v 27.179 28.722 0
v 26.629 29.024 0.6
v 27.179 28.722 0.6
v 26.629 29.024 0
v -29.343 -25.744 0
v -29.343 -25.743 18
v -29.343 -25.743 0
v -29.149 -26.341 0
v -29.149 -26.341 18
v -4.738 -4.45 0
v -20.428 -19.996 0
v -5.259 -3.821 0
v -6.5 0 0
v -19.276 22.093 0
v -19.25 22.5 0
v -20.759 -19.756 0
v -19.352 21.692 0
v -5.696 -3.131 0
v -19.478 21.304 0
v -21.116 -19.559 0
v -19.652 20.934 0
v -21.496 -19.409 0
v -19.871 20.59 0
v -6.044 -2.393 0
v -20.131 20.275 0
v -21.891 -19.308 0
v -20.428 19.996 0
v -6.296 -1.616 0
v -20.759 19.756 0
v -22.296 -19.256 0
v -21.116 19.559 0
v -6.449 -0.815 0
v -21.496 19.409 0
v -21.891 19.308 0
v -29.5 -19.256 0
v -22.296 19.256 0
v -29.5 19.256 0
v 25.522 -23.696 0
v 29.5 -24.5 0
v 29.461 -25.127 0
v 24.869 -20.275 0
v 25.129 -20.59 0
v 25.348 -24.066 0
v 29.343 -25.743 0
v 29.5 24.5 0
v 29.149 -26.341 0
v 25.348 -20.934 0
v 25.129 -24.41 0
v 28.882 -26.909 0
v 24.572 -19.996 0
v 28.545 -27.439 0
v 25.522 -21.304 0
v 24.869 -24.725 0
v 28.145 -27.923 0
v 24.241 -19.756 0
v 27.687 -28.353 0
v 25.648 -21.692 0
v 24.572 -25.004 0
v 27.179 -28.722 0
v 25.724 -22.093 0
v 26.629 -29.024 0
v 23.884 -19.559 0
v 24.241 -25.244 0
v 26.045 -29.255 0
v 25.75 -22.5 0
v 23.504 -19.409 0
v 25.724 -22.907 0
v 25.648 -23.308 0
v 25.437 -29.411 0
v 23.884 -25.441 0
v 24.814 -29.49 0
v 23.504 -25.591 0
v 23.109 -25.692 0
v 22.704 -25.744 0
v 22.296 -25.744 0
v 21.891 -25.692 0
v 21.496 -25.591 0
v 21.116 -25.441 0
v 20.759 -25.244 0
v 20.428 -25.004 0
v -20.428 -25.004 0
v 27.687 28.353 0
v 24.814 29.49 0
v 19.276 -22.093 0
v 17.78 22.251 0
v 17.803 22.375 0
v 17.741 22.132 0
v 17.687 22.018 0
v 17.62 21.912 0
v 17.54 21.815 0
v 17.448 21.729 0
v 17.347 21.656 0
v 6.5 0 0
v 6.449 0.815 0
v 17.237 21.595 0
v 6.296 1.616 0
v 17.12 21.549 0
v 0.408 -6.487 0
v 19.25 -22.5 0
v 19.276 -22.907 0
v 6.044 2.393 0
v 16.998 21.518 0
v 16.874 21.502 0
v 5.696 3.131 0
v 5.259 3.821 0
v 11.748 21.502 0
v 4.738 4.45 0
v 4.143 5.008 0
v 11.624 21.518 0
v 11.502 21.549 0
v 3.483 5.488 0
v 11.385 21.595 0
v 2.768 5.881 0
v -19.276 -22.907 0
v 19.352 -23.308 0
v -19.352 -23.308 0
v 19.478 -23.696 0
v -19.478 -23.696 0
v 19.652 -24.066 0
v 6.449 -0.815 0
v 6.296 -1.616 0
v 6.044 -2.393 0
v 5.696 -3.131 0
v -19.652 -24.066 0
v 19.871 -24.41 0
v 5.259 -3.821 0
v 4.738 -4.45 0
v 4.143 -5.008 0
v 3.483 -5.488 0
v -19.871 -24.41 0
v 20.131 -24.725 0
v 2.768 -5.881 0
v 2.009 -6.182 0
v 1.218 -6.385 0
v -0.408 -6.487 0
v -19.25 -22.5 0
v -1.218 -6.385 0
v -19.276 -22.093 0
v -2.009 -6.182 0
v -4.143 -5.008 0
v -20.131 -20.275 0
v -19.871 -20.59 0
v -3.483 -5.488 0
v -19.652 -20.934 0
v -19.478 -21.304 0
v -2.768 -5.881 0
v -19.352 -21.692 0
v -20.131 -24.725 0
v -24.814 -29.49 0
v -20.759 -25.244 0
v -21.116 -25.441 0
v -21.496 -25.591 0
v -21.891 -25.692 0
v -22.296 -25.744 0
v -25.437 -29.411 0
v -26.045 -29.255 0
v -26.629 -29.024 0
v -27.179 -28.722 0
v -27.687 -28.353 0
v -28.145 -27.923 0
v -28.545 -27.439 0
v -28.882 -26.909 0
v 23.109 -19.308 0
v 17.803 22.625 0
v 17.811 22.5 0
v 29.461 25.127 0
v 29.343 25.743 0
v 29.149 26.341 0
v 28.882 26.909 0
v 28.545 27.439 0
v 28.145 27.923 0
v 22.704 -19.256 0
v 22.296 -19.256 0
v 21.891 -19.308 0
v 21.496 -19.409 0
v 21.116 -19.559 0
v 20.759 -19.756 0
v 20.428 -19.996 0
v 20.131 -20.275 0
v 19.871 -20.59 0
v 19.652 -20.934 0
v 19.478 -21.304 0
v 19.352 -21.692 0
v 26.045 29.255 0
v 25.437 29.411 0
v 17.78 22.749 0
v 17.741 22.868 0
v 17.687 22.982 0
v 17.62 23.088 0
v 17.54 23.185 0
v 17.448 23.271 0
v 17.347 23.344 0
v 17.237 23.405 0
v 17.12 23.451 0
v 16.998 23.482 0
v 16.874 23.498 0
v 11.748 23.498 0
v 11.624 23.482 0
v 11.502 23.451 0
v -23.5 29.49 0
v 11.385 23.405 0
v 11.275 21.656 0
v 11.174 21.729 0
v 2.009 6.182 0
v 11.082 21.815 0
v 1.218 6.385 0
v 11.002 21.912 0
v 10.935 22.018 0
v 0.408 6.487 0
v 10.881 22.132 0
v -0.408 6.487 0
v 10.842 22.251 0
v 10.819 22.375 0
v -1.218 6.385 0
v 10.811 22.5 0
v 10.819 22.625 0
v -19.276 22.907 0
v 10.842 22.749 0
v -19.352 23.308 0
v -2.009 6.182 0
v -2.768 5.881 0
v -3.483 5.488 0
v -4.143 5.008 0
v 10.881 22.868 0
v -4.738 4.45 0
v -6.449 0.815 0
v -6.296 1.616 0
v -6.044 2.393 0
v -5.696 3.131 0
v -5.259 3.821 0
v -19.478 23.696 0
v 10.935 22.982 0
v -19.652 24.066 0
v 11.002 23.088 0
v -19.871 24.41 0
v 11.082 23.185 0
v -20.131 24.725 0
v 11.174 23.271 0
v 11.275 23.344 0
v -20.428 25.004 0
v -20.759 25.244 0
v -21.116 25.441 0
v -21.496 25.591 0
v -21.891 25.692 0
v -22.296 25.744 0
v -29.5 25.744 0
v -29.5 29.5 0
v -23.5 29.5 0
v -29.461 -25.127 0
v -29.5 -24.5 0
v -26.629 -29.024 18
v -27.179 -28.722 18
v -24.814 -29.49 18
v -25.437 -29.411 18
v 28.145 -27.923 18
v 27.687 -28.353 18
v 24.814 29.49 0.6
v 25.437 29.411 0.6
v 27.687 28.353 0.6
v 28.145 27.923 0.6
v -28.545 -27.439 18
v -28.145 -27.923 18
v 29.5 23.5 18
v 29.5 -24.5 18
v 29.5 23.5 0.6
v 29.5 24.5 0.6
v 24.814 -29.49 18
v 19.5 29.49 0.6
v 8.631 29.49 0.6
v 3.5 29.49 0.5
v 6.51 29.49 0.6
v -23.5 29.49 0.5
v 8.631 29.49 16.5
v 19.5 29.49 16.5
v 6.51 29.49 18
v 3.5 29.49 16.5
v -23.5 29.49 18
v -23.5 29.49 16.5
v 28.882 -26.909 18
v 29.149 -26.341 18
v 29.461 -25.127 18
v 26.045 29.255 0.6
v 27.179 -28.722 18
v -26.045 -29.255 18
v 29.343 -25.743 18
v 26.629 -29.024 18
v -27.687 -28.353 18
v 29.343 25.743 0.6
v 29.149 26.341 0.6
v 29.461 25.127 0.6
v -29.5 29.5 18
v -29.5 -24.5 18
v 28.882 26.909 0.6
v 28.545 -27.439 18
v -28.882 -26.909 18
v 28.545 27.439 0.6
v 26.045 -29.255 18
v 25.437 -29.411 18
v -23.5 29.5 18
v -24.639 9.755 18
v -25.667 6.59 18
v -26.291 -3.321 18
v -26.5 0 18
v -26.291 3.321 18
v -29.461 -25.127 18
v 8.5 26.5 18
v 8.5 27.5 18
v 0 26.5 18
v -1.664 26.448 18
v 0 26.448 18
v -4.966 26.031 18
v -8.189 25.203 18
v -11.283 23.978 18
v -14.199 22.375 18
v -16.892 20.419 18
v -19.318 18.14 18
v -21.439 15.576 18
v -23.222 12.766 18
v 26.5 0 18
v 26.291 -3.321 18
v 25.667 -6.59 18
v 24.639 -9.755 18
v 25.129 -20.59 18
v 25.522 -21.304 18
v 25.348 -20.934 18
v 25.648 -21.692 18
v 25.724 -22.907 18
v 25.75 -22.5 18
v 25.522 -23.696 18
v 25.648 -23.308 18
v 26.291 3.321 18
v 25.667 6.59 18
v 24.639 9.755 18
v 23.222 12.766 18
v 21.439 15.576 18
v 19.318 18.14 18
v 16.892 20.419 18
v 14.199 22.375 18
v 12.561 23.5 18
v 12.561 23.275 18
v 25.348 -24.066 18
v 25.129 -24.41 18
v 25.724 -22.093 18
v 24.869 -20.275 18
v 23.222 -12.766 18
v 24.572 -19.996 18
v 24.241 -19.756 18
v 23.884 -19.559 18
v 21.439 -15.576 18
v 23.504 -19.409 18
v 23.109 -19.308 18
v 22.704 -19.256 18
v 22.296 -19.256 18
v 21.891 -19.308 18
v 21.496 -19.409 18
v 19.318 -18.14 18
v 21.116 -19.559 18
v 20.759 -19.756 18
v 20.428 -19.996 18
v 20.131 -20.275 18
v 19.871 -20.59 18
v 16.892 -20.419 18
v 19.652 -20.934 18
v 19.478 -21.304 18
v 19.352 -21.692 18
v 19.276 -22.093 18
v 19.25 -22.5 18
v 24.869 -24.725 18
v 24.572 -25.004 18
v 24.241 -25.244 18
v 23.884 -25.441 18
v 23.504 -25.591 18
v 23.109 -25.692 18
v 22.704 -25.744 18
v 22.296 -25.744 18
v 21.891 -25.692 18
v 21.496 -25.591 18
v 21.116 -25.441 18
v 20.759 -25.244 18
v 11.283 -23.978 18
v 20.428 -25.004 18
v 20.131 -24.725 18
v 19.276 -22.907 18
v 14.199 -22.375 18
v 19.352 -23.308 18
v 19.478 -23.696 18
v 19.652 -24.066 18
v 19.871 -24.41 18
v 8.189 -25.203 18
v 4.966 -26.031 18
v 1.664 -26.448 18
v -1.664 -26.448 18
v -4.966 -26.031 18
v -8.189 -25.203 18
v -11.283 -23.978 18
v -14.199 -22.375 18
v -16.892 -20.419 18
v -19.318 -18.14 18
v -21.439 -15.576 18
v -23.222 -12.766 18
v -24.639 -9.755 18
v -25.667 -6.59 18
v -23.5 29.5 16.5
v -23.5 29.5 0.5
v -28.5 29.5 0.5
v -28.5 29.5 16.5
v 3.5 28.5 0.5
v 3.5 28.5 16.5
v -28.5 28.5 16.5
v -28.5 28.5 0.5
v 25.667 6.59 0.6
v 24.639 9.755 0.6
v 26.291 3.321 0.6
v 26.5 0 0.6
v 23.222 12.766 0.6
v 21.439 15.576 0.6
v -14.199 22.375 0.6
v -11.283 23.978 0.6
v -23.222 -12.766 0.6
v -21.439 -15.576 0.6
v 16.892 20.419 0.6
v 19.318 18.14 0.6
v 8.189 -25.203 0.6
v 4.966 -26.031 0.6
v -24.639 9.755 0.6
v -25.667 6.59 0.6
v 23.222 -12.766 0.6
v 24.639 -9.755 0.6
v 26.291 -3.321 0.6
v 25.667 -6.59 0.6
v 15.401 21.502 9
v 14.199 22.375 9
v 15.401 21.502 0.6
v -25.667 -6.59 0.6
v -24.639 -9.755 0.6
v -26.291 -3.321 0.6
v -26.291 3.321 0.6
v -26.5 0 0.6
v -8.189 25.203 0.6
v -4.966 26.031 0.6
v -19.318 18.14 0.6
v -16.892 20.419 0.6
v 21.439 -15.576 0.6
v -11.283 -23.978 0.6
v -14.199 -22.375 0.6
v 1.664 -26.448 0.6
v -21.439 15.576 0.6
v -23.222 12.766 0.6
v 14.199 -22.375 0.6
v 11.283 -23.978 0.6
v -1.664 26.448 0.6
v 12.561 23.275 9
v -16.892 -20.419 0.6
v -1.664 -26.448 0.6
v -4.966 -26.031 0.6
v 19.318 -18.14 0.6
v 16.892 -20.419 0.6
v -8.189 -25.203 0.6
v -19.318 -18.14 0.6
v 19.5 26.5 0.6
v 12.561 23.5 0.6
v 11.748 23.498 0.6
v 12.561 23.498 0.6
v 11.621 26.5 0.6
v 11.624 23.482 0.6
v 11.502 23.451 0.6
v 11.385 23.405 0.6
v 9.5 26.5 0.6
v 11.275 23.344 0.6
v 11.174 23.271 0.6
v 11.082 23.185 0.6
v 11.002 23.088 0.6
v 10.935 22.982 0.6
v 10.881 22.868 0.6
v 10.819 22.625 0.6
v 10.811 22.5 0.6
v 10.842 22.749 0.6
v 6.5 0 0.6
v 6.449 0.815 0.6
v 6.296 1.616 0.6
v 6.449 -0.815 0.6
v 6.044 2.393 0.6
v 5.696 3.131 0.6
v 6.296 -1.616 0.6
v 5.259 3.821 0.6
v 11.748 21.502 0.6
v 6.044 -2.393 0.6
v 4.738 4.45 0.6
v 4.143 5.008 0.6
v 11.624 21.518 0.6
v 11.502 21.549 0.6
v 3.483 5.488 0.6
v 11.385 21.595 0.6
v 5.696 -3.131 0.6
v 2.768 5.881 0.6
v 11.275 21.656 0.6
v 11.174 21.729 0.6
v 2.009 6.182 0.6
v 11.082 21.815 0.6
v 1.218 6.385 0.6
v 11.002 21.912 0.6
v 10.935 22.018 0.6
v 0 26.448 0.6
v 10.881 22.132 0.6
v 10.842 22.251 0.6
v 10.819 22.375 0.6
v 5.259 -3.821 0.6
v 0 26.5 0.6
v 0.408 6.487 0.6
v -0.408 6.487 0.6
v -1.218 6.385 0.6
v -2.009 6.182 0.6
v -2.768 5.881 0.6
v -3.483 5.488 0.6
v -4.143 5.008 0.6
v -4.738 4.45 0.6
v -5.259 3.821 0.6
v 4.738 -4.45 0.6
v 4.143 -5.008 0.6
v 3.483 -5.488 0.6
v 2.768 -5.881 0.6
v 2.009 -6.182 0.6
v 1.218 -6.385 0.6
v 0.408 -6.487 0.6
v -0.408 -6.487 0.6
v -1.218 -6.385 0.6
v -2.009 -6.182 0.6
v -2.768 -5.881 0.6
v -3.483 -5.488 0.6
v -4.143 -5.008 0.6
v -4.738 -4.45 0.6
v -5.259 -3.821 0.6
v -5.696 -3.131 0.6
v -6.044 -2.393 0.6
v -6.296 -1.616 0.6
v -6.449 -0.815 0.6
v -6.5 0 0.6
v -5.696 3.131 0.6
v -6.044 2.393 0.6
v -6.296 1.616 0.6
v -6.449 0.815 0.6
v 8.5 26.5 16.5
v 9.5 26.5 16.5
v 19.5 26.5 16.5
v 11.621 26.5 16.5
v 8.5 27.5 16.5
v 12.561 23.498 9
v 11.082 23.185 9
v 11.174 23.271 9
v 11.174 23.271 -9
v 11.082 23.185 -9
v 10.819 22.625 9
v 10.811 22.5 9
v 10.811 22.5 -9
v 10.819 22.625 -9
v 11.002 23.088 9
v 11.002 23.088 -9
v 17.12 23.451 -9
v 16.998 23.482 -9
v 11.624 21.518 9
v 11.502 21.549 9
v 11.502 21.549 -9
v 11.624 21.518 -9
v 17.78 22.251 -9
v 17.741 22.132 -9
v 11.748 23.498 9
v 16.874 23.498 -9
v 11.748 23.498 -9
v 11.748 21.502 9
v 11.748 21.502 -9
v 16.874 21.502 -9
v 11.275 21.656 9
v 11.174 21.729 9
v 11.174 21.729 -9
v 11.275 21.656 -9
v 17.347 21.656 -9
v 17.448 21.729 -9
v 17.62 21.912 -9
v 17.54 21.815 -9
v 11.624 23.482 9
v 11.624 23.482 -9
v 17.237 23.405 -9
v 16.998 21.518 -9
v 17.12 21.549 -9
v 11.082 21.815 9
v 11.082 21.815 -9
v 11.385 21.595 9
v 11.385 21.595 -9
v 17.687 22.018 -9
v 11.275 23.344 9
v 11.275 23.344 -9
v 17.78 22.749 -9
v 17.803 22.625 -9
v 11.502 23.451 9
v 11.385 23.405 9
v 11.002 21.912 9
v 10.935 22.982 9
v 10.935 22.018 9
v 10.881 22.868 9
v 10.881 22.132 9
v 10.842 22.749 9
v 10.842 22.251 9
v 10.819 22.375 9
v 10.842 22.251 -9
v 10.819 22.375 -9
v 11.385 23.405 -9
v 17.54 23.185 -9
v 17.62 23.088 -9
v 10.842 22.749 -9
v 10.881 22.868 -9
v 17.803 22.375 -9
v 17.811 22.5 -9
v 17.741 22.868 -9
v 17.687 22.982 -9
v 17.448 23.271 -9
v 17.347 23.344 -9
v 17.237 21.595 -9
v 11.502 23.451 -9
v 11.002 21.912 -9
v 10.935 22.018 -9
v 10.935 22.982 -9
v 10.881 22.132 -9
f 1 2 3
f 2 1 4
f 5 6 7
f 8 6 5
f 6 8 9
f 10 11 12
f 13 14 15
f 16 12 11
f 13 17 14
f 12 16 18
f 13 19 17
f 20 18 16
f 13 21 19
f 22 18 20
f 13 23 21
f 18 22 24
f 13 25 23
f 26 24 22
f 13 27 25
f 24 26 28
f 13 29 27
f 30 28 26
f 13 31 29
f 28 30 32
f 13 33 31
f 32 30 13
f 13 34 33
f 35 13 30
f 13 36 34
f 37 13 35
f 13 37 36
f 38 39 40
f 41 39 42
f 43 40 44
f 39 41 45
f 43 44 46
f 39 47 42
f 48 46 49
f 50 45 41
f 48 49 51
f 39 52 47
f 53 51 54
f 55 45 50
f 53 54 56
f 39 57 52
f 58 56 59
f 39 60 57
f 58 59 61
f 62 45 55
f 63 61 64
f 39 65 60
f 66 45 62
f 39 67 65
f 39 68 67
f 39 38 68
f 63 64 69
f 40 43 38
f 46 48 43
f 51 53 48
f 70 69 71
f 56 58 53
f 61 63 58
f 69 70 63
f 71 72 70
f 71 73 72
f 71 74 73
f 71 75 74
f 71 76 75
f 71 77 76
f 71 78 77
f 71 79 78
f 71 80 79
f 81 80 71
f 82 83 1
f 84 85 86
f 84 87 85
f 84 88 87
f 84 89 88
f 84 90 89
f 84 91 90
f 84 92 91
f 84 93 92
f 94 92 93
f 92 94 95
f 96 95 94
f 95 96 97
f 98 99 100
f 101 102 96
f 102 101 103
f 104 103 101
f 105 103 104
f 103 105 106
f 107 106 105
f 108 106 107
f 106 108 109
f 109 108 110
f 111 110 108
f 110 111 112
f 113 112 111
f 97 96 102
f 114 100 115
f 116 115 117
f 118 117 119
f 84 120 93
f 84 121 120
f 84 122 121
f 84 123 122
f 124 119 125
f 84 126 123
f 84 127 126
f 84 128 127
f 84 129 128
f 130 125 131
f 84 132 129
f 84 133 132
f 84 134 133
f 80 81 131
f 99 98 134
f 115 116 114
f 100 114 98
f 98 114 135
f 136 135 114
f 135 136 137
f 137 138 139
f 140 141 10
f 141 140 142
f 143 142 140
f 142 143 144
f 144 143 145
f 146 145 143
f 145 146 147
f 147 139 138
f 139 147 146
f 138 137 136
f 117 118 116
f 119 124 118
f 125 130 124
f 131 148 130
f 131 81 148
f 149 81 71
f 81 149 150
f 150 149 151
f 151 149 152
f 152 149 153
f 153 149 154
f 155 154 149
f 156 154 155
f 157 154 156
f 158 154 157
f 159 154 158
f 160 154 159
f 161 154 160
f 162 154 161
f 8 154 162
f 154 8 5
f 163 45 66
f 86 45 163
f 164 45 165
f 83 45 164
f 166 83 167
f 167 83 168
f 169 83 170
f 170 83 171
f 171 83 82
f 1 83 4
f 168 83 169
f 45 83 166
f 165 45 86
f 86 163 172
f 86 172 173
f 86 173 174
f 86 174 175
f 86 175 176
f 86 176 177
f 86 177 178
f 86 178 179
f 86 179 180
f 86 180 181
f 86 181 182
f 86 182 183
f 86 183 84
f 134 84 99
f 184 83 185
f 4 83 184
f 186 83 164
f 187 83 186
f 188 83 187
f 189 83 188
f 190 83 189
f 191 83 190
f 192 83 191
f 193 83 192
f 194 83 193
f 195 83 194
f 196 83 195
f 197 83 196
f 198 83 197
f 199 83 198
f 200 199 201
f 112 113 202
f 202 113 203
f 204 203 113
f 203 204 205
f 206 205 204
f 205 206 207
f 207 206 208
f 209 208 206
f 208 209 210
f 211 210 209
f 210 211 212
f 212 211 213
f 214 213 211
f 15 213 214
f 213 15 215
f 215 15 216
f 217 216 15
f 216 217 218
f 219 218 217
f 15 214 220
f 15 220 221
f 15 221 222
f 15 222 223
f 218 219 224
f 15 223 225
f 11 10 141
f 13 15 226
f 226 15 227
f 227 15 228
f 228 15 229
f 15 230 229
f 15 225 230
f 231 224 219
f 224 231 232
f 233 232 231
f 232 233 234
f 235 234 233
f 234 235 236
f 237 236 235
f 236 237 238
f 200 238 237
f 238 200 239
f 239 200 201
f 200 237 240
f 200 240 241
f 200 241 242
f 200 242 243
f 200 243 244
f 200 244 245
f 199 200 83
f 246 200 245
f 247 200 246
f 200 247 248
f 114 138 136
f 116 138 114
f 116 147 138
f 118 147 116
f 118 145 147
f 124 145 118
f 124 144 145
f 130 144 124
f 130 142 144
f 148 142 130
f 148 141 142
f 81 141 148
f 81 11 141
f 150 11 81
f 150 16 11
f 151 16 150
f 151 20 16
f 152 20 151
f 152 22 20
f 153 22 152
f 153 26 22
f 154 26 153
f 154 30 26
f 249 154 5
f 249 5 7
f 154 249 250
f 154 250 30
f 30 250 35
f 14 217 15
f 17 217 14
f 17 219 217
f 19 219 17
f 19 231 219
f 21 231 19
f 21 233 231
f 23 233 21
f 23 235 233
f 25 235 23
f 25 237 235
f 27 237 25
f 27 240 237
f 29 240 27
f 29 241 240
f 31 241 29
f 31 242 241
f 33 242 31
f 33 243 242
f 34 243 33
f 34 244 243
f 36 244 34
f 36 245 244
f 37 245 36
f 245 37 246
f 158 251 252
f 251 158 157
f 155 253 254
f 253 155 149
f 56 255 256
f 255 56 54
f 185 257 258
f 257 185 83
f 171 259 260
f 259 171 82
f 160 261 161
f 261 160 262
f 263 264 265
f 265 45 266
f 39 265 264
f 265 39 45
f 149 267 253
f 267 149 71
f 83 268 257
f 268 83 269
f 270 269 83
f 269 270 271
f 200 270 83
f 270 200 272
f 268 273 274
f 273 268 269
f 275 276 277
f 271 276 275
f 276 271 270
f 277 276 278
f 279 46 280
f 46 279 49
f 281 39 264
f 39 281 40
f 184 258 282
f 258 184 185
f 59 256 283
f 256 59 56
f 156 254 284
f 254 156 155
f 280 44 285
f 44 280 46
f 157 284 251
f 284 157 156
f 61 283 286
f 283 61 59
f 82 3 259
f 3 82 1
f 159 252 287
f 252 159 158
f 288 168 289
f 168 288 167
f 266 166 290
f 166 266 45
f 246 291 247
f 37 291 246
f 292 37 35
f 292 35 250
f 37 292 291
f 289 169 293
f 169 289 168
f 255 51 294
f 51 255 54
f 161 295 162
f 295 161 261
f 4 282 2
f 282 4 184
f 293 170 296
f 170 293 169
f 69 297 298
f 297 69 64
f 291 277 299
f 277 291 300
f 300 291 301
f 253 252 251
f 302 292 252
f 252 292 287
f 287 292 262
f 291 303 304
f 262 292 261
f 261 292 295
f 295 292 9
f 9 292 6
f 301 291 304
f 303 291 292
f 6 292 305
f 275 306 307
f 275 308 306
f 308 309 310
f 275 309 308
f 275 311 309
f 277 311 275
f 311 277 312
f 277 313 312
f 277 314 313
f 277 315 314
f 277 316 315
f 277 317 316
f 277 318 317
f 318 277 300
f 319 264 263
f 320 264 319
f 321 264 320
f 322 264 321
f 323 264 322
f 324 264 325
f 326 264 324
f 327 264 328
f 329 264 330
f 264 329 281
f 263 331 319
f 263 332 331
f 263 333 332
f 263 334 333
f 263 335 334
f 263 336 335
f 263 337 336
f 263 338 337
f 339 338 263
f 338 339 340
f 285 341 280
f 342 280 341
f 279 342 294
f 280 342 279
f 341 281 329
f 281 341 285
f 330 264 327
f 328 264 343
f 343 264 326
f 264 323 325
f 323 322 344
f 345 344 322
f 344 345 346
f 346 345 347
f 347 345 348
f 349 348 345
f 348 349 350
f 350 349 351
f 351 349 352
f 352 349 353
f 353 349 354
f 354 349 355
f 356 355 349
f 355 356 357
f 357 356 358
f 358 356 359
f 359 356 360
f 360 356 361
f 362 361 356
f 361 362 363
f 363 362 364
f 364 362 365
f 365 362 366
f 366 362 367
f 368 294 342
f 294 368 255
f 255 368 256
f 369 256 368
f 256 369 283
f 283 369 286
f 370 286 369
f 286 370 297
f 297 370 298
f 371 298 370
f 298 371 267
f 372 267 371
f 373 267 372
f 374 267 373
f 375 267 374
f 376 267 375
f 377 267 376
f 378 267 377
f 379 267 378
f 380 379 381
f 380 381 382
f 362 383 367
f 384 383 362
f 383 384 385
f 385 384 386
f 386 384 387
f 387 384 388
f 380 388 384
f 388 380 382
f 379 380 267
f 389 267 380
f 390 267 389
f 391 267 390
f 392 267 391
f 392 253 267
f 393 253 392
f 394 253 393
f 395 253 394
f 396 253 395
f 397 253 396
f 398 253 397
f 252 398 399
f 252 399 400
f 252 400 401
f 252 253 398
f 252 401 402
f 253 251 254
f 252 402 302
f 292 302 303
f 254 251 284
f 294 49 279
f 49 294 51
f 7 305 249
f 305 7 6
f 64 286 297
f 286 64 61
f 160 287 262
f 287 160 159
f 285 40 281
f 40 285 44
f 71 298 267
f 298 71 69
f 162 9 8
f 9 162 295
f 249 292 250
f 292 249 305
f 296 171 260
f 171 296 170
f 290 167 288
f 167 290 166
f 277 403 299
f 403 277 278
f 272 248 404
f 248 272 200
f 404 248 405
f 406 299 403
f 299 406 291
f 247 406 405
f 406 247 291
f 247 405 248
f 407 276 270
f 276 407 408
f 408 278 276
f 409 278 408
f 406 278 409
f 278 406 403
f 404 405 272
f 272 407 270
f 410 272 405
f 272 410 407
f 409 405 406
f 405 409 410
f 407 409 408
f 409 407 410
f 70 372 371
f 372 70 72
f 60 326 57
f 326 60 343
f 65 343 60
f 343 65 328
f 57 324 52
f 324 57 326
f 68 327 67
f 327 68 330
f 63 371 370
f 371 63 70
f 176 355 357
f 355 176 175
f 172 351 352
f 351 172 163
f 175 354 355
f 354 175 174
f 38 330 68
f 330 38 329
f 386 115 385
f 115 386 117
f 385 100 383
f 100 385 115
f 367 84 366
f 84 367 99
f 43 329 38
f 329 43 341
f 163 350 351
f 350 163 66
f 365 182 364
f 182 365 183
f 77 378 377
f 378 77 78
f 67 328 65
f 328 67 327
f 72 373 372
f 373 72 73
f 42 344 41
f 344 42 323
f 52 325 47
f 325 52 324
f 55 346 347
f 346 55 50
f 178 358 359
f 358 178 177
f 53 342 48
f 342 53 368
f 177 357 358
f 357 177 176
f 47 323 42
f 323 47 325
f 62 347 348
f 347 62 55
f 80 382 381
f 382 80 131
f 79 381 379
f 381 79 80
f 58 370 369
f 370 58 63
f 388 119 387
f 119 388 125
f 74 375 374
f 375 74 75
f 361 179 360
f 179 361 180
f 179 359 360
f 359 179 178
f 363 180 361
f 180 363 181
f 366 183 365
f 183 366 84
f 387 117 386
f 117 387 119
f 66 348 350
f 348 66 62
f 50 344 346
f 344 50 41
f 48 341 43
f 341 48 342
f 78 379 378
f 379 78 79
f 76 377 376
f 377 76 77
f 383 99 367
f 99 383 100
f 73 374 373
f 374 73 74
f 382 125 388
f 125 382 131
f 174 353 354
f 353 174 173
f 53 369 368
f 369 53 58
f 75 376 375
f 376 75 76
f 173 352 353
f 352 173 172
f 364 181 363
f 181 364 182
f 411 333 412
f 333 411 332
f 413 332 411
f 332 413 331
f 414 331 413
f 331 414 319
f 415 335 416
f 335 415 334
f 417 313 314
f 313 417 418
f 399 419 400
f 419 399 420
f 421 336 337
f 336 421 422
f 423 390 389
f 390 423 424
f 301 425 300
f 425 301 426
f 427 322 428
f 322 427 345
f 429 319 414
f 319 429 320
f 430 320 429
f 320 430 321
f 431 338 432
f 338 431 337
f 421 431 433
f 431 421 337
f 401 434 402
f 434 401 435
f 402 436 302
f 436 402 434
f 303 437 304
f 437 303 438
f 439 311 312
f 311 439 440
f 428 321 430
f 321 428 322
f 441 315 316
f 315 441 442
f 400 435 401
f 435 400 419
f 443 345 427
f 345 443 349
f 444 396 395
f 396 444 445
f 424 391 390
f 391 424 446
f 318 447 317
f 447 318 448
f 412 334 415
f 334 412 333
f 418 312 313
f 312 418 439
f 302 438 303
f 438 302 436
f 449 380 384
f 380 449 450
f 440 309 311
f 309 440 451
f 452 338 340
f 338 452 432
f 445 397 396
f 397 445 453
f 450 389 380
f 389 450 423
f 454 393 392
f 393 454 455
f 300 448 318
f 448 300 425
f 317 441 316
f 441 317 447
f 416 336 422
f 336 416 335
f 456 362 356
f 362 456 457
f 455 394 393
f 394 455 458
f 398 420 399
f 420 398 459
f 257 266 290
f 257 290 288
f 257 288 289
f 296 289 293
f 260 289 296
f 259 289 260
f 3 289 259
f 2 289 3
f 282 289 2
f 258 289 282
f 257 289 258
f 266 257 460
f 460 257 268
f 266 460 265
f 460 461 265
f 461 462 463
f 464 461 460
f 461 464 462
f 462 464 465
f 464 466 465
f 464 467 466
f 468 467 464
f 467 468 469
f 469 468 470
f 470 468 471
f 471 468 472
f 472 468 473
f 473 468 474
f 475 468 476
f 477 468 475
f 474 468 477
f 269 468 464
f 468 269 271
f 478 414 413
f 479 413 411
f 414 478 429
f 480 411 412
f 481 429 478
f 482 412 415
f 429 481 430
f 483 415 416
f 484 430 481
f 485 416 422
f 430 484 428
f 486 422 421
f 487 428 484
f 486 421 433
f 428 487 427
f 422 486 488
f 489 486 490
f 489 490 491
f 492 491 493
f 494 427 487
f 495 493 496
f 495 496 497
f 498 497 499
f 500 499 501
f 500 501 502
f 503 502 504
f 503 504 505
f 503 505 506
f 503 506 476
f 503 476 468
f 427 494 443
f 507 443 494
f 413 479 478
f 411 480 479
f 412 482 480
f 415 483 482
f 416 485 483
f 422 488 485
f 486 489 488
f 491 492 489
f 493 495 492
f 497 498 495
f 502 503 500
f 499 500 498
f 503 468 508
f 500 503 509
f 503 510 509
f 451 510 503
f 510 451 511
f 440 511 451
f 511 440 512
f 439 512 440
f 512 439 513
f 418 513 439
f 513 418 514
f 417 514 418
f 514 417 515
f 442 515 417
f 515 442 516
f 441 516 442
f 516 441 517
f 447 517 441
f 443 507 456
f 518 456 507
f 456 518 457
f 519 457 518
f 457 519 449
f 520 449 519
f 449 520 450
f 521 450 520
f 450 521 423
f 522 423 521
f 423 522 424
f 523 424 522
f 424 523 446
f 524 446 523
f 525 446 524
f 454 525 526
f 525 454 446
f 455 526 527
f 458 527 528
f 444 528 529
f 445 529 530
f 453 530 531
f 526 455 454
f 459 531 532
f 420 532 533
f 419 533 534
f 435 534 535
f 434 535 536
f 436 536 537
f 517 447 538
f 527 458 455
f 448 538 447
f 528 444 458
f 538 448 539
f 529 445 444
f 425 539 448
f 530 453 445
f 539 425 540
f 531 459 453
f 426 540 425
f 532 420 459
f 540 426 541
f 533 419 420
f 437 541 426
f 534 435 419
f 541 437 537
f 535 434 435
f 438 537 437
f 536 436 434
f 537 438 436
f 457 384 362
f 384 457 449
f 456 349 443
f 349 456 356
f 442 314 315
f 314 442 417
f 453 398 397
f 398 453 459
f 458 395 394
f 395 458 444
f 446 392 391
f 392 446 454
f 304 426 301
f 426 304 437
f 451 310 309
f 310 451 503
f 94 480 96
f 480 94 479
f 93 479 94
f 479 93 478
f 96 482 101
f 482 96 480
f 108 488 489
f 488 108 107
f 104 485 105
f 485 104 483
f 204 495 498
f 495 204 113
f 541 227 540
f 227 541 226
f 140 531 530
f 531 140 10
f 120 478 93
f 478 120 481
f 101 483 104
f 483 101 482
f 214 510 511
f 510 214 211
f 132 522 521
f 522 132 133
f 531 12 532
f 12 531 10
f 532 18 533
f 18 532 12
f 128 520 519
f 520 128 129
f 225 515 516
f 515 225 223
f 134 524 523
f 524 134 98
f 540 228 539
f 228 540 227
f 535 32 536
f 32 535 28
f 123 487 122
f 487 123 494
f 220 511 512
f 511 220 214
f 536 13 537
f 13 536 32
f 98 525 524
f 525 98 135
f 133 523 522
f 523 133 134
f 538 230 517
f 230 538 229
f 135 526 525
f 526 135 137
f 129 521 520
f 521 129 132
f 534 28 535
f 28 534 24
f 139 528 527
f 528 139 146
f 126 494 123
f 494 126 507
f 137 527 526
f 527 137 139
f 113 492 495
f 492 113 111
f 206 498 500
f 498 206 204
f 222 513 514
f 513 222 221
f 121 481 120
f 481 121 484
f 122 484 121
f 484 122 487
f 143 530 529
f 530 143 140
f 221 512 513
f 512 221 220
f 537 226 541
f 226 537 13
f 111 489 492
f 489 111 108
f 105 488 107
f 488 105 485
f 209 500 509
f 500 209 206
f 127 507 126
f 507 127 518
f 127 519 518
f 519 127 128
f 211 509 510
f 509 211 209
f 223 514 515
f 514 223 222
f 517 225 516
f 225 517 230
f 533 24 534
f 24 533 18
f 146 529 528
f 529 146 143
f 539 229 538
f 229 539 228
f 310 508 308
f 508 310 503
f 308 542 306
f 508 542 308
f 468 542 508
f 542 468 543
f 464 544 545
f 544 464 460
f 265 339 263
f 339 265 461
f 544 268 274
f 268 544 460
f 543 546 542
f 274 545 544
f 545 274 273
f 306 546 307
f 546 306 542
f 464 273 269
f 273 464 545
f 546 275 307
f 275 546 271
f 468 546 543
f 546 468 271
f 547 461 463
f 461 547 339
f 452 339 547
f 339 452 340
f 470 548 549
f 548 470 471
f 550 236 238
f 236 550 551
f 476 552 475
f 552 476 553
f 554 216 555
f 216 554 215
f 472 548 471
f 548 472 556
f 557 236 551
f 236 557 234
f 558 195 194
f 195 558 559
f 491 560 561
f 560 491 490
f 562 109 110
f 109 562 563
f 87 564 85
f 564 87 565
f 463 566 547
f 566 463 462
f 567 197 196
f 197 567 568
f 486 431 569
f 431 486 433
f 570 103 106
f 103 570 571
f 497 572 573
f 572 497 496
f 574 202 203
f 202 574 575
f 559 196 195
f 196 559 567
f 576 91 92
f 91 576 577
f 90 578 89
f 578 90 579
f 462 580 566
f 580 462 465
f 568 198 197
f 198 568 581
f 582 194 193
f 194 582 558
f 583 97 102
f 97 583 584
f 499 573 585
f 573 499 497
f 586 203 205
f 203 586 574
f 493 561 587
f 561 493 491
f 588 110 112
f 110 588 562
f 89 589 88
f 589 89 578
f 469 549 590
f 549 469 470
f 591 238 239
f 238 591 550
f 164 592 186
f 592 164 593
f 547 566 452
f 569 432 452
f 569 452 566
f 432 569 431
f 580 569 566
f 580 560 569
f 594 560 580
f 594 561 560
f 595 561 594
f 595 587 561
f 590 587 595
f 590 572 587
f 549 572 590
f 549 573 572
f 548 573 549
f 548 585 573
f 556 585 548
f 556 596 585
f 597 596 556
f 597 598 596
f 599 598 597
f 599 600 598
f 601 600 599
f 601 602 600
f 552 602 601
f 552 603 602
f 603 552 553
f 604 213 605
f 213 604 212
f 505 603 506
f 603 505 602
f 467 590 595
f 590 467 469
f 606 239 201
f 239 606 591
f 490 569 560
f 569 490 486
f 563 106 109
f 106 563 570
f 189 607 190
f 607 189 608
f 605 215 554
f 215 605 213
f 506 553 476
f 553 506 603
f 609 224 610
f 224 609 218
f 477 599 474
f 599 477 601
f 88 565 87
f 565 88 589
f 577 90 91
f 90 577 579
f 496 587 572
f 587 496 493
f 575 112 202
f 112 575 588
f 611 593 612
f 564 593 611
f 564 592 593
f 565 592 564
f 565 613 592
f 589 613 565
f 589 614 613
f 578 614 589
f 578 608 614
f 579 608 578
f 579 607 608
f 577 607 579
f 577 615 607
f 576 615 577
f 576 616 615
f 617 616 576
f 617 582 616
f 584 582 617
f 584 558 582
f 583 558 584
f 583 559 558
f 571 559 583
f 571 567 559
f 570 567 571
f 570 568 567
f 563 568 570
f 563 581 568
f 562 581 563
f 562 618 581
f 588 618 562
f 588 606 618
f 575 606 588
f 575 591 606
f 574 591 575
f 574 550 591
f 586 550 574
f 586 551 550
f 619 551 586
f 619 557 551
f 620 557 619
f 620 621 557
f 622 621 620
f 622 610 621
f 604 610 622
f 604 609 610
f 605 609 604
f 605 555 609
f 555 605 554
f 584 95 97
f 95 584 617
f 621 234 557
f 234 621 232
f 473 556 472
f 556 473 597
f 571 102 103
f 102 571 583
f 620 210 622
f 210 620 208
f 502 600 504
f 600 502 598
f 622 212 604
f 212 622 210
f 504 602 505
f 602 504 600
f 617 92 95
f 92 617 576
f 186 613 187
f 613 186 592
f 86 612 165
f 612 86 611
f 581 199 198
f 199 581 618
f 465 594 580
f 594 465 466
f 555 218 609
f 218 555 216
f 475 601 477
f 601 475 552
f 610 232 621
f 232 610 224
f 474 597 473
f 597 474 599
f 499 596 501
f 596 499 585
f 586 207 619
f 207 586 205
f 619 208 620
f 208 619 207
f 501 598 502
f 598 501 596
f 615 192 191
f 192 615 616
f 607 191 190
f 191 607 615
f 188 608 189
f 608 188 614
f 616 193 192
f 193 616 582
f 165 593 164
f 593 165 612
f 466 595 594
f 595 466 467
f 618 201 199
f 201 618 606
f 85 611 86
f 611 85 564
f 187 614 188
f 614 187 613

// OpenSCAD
$fn = 50;


union() {
	difference() {
		union() {
			hull() {
				translate(v = [-24.5000000000, 24.5000000000, 0]) {
					cylinder(h = 18, r = 5);
				}
				translate(v = [24.5000000000, 24.5000000000, 0]) {
					cylinder(h = 18, r = 5);
				}
				translate(v = [-24.5000000000, -24.5000000000, 0]) {
					cylinder(h = 18, r = 5);
				}
				translate(v = [24.5000000000, -24.5000000000, 0]) {
					cylinder(h = 18, r = 5);
				}
			}
			translate(v = [-29.5000000000, 23.5000000000, 0]) {
				cube(size = [6, 6, 18]);
			}
		}
		union() {
			translate(v = [-30.0000000000, -22.5000000000, -250.0000000000]) {
				rotate(a = [0, 0, 0]) {
					difference() {
						union() {
							hull() {
								translate(v = [7.5000000000, 0, 0]) {
									cylinder(h = 250, r = 3.2500000000, r1 = 3.2500000000, r2 = 3.2500000000);
								}
								translate(v = [-7.5000000000, 0, 0]) {
									cylinder(h = 250, r = 3.2500000000, r1 = 3.2500000000, r2 = 3.2500000000);
								}
							}
						}
						union();
					}
				}
			}
			translate(v = [-30.0000000000, 22.5000000000, -250.0000000000]) {
				rotate(a = [0, 0, 0]) {
					difference() {
						union() {
							hull() {
								translate(v = [7.5000000000, 0, 0]) {
									cylinder(h = 250, r = 3.2500000000, r1 = 3.2500000000, r2 = 3.2500000000);
								}
								translate(v = [-7.5000000000, 0, 0]) {
									cylinder(h = 250, r = 3.2500000000, r1 = 3.2500000000, r2 = 3.2500000000);
								}
							}
						}
						union();
					}
				}
			}
			translate(v = [-28.5000000000, 28.5000000000, 0.5000000000]) {
				cube(size = [32, 1, 16]);
			}
			translate(v = [22.5000000000, -22.5000000000, 0]) {
				cylinder(h = 100, r = 3.2500000000);
			}
			translate(v = [0, 0, 0.6000000000]) {
				cylinder(h = 20.4000000000, r = 26.5000000000);
			}
			translate(v = [0, 0, -9.0000000000]) {
				cylinder(h = 18, r = 6.5000000000);
			}
			translate(v = [0.0000000000, 23.5000000000, 0.6000000000]) {
				cube(size = [29.5000000000, 3, 20.4000000000]);
			}
			translate(v = [19.5000000000, 23.5000000000, 0.6000000000]) {
				cube(size = [10, 6, 20.4000000000]);
			}
			translate(v = [8.5000000000, 23.5000000000, 16.5000000000]) {
				cube(size = [21, 6, 1.5000000000]);
			}
			translate(v = [5.7500000000, 30.2500000000, 0.6000000000]) {
				rotate(a = [0, 0, -45]) {
					cube(size = [7.5000000000, 1.5000000000, 20.4000000000]);
				}
			}
			translate(v = [5.0610000000, 21.5000000000, 0.6000000000]) {
				cube(size = [7.5000000000, 2, 17.4000000000]);
			}
		}
	}
	union() {
		translate(v = [14.3110000000, 22.5000000000, -9.0000000000]) {
			rotate(a = [0, 0, 0]) {
				difference() {
					union() {
						#hull() {
							#translate(v = [2.5000000000, 0, 0]) {
								cylinder(h = 18, r = 1.0000000000, r1 = 1.0000000000, r2 = 1.0000000000);
							}
							#translate(v = [-2.5000000000, 0, 0]) {
								cylinder(h = 18, r = 1.0000000000, r1 = 1.0000000000, r2 = 1.0000000000);
							}
						}
					}
					union();
				}
			}
		}
	}
}
